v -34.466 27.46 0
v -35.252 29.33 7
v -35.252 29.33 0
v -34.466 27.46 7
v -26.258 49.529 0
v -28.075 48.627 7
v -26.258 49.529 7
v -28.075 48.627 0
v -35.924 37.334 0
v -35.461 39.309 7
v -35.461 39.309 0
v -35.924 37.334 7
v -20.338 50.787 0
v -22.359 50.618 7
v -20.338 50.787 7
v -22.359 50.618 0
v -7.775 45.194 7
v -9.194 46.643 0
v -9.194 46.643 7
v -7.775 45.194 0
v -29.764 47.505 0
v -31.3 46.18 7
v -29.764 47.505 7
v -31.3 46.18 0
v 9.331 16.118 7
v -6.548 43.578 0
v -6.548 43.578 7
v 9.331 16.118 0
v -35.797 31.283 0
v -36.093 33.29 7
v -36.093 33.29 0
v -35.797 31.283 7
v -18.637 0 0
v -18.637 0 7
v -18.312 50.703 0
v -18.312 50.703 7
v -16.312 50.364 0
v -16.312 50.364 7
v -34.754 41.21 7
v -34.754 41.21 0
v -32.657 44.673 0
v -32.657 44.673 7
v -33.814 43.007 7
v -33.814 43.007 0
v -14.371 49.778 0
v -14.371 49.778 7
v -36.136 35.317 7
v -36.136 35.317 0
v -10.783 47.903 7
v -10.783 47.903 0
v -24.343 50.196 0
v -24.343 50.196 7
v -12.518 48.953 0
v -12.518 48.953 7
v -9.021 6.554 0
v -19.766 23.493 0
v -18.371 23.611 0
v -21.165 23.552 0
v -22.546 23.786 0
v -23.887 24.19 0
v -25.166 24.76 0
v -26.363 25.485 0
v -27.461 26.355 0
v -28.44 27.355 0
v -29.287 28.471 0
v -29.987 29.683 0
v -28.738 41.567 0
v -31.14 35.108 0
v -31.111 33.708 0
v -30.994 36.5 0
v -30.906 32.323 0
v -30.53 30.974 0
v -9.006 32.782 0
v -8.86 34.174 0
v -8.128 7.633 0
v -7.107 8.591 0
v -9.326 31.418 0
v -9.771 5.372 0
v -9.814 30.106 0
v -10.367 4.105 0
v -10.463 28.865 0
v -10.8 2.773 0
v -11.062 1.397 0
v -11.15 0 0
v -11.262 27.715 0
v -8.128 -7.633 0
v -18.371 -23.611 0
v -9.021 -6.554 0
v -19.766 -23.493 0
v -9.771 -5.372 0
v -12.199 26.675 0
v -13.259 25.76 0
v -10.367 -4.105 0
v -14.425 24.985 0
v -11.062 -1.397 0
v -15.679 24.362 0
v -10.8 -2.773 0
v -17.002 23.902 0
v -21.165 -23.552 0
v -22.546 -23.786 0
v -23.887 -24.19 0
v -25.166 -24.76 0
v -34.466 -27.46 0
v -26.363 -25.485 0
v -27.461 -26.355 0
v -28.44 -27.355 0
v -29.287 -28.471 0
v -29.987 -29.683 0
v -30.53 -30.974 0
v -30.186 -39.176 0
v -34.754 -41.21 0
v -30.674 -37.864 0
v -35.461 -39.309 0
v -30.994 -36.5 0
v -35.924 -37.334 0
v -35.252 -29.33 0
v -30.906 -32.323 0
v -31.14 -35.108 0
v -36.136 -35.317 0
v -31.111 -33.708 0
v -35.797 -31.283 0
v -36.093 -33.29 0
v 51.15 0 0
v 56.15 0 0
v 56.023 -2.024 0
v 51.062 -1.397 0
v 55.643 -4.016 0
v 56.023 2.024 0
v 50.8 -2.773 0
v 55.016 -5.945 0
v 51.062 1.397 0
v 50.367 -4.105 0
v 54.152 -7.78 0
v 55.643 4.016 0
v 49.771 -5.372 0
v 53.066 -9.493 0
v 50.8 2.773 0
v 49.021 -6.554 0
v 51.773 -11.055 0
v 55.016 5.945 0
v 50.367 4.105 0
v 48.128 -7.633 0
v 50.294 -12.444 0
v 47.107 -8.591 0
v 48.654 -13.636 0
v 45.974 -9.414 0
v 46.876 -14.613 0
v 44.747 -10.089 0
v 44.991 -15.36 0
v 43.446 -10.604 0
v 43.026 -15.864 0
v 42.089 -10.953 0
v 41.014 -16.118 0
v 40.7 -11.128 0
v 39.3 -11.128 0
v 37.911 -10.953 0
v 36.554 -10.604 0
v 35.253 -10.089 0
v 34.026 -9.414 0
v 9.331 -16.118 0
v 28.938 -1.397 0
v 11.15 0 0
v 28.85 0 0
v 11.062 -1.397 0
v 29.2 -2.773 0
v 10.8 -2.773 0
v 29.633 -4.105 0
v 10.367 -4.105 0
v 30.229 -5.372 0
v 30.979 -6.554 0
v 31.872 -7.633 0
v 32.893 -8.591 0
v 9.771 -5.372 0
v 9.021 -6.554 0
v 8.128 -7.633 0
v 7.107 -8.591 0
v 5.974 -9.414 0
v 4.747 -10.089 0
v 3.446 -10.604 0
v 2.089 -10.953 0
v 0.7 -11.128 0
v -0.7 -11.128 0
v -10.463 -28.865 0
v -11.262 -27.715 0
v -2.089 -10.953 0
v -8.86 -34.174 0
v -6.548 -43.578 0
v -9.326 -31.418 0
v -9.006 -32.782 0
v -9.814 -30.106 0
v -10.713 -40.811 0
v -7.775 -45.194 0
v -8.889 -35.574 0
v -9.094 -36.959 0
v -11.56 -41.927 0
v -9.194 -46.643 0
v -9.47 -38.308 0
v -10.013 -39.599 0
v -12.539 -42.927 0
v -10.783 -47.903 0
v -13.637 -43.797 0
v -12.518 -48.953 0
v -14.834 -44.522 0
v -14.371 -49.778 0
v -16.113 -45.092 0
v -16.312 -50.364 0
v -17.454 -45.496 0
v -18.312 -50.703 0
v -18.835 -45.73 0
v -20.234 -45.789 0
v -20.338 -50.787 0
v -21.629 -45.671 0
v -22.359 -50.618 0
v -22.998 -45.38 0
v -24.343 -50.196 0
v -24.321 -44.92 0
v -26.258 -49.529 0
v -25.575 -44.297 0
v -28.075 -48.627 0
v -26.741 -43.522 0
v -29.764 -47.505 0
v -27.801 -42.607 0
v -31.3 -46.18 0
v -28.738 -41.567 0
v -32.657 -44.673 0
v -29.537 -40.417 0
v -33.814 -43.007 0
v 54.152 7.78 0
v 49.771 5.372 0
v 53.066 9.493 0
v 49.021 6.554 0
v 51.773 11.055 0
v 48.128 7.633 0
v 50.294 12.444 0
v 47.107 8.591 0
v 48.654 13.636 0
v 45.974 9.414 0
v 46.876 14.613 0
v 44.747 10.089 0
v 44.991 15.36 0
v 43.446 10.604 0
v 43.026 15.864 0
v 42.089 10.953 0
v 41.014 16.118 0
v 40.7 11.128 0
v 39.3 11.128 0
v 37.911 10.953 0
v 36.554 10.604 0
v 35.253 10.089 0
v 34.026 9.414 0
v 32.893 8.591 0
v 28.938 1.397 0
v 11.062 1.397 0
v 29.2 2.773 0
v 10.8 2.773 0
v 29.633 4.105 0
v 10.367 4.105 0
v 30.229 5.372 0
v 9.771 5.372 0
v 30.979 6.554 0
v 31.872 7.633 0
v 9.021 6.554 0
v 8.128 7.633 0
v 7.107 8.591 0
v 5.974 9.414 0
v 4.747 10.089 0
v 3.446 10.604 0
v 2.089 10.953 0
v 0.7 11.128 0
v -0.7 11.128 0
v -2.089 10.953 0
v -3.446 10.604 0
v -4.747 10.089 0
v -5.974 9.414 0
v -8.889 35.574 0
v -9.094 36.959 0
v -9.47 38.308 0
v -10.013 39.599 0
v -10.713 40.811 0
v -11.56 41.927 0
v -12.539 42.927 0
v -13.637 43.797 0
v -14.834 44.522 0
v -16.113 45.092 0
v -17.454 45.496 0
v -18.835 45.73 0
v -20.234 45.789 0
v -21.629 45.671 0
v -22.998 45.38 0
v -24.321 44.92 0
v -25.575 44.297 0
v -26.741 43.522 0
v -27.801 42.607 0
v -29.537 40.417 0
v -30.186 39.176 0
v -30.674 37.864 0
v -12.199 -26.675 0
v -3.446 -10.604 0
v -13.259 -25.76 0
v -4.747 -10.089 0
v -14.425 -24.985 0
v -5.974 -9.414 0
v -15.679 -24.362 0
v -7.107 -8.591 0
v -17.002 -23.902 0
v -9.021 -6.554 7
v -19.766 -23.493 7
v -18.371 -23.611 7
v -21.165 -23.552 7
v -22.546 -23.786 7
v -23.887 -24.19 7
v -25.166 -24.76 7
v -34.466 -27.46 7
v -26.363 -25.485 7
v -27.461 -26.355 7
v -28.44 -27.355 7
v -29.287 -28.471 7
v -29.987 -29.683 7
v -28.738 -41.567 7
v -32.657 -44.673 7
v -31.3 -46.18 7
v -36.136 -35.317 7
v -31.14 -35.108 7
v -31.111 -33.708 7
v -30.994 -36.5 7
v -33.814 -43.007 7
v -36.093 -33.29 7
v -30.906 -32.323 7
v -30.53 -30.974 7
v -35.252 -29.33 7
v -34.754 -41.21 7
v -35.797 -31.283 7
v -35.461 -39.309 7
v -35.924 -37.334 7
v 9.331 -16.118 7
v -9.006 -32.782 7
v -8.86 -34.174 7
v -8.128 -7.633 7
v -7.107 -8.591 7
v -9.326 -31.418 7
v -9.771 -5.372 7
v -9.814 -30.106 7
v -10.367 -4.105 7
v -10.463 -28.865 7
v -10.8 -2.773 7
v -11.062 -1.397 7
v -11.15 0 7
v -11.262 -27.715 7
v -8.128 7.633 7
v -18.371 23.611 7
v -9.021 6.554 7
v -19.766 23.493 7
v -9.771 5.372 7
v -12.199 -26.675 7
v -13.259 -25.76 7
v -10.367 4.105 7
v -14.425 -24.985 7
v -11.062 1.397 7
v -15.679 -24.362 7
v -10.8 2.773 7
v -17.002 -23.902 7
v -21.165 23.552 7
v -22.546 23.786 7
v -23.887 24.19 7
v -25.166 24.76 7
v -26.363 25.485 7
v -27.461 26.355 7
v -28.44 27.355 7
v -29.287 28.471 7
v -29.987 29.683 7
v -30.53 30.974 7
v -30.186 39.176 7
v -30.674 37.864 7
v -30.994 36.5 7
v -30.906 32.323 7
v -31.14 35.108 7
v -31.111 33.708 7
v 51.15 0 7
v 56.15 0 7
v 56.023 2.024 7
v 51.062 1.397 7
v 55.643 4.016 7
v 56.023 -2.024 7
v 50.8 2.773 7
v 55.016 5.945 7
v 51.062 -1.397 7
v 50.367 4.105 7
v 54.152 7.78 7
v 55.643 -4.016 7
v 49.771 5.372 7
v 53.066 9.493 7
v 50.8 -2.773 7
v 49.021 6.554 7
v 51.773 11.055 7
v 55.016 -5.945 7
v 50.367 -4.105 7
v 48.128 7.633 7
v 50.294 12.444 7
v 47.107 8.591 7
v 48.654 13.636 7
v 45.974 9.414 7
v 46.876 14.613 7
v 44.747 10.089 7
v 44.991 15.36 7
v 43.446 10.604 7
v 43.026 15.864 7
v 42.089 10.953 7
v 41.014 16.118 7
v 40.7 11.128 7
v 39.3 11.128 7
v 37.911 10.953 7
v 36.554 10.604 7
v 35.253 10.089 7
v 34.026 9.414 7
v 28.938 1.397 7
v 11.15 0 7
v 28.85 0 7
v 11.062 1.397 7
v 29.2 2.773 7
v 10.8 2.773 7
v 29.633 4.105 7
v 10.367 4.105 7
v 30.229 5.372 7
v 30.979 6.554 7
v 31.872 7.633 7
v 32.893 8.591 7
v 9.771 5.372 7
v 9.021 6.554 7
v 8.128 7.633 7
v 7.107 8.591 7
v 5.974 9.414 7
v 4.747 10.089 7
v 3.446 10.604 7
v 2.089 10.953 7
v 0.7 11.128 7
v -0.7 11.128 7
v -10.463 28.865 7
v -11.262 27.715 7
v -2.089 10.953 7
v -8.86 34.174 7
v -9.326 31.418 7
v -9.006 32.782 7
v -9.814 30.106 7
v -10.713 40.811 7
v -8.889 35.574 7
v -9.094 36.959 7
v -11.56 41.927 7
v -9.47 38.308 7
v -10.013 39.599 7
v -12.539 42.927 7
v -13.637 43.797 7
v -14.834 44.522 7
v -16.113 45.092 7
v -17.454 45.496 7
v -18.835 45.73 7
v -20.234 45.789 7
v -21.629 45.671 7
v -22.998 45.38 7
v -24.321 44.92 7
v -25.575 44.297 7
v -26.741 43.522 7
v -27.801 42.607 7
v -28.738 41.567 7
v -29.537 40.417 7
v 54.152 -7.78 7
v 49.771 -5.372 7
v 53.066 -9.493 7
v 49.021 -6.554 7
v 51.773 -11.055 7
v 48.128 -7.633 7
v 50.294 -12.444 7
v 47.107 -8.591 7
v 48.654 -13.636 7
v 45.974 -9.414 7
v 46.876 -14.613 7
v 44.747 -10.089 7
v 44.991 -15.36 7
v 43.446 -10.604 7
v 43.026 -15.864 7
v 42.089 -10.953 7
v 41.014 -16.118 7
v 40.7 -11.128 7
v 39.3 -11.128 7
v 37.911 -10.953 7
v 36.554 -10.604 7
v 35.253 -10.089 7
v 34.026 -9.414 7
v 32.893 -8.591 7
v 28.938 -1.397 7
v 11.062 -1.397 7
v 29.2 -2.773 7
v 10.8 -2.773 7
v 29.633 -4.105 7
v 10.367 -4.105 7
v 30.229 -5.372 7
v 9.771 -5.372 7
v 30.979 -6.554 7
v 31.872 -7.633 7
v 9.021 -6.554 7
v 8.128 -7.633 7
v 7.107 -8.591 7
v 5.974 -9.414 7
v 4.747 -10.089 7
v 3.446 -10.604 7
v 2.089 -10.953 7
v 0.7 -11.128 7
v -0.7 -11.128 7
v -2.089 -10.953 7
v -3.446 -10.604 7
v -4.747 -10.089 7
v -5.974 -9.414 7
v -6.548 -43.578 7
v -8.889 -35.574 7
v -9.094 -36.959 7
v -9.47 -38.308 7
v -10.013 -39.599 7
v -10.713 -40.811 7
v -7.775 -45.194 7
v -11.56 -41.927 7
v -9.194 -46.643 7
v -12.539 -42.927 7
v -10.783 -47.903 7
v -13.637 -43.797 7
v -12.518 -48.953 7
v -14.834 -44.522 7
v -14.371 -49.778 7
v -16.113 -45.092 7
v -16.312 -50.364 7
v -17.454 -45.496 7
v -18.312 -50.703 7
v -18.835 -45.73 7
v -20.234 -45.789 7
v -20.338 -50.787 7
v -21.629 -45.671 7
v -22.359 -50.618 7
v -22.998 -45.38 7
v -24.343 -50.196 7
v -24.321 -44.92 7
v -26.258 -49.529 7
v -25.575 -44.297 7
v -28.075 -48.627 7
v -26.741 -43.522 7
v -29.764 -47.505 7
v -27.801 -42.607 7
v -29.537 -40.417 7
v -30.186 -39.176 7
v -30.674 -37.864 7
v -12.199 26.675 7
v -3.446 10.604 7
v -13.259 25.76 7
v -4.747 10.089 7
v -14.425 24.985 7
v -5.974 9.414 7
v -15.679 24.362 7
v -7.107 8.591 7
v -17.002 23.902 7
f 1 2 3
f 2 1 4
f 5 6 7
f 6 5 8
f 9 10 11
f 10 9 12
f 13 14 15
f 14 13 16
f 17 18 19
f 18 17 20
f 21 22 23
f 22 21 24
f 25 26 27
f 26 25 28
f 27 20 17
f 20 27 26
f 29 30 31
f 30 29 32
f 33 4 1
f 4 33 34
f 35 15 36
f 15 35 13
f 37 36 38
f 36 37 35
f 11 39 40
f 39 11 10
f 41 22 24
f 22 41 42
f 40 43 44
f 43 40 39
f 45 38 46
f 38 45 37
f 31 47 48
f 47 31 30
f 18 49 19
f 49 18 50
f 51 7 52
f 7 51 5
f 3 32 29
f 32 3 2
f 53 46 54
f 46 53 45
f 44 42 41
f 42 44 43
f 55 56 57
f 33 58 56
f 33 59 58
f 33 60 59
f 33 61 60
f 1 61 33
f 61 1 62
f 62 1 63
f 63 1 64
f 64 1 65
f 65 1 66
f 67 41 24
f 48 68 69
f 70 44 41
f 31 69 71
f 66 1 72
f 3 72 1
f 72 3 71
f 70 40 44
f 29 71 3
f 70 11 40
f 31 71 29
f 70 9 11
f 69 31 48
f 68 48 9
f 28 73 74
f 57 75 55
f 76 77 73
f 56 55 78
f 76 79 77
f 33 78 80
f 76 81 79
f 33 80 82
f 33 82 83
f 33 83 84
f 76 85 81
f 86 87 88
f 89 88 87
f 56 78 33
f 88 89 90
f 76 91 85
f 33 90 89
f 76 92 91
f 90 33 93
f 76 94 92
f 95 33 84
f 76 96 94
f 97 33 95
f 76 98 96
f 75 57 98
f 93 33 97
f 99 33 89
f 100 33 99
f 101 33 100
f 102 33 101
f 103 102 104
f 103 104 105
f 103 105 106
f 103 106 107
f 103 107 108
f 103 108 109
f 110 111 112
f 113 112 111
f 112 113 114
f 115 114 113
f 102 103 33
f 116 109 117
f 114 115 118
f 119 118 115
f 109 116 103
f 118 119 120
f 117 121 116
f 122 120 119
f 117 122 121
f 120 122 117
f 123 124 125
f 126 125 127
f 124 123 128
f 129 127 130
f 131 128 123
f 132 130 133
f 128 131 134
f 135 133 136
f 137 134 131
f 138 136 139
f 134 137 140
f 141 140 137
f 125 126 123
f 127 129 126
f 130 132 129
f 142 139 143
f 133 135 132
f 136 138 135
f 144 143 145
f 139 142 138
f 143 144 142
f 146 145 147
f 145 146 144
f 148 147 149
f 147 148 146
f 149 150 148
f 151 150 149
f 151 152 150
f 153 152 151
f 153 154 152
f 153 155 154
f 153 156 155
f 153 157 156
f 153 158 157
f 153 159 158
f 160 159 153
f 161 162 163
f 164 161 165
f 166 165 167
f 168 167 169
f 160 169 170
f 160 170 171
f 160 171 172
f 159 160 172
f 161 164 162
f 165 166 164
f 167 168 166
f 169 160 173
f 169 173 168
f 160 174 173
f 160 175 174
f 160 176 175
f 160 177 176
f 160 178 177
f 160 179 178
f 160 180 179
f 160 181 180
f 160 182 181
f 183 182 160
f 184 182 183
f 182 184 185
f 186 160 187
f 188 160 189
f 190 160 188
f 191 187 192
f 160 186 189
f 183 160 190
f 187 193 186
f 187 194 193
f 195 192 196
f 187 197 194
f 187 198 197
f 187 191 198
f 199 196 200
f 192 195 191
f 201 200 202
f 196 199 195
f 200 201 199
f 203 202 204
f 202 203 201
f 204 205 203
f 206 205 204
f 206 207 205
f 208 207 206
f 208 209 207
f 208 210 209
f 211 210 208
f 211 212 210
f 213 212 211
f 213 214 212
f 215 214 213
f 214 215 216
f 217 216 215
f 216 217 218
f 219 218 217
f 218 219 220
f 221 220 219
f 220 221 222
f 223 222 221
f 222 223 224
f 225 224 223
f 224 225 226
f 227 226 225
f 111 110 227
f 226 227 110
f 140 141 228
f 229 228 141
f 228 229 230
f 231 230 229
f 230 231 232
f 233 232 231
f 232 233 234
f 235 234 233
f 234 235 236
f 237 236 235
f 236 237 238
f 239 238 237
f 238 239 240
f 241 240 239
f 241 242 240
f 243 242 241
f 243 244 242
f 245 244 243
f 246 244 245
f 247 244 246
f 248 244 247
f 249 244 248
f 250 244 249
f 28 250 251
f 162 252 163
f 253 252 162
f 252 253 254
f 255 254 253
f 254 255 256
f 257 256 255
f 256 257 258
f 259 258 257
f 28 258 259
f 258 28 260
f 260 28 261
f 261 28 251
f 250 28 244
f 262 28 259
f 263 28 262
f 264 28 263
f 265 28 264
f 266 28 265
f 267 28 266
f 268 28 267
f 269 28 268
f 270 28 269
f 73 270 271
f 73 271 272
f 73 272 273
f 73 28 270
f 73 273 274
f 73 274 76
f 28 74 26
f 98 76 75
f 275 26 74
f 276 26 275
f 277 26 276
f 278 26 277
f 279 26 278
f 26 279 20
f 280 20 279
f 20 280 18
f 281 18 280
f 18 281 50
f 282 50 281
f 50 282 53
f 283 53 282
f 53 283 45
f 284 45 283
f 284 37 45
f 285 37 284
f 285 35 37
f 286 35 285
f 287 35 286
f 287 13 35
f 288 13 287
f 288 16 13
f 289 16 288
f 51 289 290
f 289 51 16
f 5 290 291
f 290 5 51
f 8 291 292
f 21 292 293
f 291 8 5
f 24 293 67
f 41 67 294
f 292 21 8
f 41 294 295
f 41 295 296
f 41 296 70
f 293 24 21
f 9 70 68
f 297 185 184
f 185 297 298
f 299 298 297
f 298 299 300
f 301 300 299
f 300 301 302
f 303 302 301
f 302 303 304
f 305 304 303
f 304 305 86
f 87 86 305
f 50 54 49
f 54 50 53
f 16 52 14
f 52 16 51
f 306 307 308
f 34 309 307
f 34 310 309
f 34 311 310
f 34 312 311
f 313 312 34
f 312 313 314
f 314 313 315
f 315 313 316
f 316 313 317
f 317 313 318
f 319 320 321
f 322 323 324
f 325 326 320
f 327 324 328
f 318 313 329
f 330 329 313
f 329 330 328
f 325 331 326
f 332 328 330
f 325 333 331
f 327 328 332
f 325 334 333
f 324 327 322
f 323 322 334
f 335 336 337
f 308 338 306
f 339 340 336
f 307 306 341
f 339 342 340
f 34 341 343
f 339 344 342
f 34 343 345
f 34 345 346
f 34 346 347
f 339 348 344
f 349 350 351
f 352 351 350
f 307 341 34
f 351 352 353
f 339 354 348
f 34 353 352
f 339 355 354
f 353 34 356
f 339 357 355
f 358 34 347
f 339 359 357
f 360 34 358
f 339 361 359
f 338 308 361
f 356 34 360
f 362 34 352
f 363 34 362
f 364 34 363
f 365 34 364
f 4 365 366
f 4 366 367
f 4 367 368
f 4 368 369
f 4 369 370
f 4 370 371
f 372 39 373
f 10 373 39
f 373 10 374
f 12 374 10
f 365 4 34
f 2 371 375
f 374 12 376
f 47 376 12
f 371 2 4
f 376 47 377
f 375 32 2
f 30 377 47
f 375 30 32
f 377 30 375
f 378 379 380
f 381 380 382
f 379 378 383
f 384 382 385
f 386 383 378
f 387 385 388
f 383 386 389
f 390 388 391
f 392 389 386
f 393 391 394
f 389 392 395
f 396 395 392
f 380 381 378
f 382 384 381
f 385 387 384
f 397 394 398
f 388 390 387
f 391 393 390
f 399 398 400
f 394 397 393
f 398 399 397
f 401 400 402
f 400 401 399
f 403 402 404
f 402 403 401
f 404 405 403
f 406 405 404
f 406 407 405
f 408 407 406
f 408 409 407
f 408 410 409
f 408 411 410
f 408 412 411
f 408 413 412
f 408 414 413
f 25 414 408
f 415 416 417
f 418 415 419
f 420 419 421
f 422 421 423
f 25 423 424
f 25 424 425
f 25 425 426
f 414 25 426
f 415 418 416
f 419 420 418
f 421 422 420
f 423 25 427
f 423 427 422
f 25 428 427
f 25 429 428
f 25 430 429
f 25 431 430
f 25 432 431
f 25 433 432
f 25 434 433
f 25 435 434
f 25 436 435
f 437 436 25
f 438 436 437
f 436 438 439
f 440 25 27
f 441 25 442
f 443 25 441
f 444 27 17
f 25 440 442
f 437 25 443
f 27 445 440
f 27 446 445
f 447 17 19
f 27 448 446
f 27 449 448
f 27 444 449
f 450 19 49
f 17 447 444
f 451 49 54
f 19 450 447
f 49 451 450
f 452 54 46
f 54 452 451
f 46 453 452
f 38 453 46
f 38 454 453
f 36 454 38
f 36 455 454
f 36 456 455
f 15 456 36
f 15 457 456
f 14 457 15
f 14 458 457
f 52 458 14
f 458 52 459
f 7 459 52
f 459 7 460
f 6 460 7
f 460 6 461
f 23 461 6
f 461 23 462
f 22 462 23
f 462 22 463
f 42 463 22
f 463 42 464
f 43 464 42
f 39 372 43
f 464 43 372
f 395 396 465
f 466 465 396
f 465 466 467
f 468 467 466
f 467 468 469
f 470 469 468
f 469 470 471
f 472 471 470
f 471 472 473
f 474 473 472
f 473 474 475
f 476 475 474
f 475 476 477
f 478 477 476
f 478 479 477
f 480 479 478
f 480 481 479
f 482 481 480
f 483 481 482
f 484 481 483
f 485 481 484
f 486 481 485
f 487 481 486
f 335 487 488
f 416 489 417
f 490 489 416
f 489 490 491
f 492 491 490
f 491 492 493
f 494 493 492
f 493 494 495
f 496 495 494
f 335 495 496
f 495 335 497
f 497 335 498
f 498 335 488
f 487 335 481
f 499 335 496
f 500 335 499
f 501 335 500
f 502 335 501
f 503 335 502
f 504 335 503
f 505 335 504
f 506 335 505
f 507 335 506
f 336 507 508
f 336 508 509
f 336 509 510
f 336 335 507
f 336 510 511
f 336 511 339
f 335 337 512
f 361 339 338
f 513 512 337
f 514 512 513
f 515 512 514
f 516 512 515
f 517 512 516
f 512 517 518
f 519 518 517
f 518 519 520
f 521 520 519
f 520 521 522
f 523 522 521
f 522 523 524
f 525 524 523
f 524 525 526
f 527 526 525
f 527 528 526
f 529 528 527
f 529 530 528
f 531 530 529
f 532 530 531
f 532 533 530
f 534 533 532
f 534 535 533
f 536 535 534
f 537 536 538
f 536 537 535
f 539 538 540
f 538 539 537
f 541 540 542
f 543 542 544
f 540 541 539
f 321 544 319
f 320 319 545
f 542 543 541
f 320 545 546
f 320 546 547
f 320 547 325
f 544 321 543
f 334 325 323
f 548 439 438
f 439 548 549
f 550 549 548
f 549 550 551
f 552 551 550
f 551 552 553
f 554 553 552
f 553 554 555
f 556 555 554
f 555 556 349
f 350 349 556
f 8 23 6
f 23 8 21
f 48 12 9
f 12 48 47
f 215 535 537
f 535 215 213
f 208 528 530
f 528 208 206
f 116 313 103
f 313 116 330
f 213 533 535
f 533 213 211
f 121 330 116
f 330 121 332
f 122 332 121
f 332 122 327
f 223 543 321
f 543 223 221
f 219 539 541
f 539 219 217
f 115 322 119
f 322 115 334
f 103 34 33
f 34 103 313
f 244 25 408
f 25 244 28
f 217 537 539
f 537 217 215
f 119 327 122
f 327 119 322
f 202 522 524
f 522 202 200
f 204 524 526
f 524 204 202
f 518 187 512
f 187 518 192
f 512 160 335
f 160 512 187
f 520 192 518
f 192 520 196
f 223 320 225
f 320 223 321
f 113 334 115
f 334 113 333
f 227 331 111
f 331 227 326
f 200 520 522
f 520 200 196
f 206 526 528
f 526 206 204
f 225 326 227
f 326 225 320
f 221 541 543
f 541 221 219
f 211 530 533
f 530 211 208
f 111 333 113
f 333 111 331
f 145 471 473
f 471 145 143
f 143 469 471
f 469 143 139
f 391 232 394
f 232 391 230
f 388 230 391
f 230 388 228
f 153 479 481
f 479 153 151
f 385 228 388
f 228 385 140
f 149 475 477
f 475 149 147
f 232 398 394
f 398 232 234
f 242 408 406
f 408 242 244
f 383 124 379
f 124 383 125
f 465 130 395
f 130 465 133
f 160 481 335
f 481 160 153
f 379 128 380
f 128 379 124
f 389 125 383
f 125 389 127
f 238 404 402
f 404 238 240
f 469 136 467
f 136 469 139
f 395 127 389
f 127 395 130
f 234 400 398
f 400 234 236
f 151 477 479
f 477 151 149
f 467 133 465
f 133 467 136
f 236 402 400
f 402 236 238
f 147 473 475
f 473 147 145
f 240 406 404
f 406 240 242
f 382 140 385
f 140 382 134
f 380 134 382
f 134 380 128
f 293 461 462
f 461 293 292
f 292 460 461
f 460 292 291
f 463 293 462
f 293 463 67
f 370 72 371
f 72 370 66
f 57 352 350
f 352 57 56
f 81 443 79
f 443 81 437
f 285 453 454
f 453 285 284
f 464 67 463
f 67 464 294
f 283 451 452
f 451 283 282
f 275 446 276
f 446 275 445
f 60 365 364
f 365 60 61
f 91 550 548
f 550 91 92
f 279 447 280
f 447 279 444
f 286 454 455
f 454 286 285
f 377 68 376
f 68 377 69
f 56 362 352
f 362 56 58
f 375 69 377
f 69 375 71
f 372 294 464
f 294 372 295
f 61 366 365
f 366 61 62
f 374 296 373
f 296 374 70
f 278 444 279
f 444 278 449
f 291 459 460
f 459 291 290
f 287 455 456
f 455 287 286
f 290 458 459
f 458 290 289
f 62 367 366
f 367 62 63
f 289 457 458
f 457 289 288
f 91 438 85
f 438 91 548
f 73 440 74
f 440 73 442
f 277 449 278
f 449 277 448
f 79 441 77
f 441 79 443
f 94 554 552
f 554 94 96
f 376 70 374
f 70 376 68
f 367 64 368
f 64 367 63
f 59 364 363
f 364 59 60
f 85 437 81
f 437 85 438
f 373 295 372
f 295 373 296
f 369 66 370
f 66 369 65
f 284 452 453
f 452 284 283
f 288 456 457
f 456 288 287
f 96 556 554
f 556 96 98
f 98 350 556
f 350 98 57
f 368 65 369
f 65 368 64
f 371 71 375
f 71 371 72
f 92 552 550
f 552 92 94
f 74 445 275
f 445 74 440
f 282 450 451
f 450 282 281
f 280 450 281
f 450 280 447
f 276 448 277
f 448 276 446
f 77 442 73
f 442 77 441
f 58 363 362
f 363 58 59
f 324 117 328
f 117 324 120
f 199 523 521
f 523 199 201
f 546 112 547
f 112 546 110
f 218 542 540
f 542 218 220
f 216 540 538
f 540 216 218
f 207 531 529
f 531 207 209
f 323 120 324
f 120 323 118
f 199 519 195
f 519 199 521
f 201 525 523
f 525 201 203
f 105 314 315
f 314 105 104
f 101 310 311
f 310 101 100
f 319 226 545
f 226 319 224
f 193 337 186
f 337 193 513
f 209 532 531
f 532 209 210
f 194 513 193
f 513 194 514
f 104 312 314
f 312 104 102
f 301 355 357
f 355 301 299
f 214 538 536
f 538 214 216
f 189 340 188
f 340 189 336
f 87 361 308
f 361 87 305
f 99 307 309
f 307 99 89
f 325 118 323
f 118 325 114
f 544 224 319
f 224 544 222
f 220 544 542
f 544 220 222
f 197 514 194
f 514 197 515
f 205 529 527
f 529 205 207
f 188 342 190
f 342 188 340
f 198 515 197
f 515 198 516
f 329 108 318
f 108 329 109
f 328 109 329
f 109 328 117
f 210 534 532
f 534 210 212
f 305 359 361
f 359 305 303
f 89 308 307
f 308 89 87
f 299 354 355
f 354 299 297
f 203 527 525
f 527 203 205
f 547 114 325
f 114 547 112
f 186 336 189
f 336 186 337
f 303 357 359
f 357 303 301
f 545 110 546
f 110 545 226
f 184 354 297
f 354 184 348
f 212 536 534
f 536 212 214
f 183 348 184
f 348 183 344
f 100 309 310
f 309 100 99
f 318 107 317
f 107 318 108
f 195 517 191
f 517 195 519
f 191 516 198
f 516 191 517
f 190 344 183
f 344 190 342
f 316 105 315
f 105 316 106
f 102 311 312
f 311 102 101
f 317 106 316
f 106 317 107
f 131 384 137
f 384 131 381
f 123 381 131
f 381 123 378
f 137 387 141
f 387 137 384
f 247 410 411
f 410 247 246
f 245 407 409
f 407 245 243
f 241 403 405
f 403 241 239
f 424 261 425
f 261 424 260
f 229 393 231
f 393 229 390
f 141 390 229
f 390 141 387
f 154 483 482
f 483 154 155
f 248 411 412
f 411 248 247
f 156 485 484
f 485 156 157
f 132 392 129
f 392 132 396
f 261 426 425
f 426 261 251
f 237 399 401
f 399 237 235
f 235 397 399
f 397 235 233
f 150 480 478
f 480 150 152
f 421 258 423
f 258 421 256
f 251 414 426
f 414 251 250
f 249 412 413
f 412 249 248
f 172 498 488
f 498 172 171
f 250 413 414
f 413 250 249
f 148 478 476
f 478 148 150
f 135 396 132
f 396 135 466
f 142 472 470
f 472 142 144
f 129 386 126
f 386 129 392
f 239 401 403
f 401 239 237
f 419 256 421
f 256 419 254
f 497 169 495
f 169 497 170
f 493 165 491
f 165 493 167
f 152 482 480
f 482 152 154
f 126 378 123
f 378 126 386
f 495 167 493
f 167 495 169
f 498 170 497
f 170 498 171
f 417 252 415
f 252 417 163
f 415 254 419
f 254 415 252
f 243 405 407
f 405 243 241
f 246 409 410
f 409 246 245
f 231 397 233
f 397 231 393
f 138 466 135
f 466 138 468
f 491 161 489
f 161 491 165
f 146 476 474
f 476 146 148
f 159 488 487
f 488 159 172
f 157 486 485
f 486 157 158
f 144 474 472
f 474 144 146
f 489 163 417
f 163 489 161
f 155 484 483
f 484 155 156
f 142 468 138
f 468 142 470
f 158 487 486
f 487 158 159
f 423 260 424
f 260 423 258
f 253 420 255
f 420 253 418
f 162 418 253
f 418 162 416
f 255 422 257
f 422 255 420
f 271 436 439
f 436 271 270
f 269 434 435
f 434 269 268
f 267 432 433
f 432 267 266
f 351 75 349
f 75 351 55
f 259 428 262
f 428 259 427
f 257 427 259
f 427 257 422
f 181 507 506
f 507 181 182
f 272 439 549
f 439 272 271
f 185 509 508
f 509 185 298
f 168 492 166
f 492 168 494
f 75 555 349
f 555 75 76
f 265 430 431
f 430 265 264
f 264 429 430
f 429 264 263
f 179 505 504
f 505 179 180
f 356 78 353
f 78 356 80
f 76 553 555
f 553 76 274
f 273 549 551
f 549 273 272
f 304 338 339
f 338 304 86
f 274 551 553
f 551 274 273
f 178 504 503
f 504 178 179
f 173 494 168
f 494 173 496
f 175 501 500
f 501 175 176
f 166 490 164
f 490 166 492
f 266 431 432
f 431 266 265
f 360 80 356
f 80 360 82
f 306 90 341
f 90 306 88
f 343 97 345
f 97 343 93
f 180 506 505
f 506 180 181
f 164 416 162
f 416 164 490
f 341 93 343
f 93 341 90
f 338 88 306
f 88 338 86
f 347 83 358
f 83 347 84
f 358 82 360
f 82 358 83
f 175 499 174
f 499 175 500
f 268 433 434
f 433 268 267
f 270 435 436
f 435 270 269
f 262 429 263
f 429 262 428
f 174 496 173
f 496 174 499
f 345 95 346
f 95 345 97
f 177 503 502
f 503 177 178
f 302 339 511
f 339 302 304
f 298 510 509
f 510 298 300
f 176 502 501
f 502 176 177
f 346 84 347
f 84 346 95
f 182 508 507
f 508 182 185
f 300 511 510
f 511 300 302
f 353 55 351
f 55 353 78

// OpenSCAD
/* [Parameters] */
//Number of outer bearings
bearingCount = 3; //[1:8]
//Radius of the bearings being used
bearingRadius = 11;
//Height of the bearings being used
bearingHeight = 7;
//Distance from the center of the central bearing to the center of the outer bearings
bearingDistance = 40;
//Thickness between the bearing and the outer perimeters
thickness = 5;
//Tolerance compensation
tolerance = .3;

/* [Hidden] */
$fn = 50;

bearingDiameter = (bearingRadius*2) + tolerance;

difference() {
    for(i = [1:bearingCount]){
        hull() {
            rotate([0,0,(360/bearingCount)*i]) {
                translate([bearingDistance,0,0]) {
                    cylinder(bearingHeight, d = bearingDiameter + (thickness*2), true);
                }
            }
            cylinder(bearingHeight, d = bearingDiameter + (thickness*2), true);
        }
    }

    union() {
        for(i = [1:bearingCount]){
            rotate([0,0,(360/bearingCount)*i]) {
                translate([bearingDistance,0,0]) {
                    cylinder(bearingHeight, d = bearingDiameter, true);
                }
            }
        }
        cylinder(bearingHeight, d = bearingDiameter, true);
    }
}
